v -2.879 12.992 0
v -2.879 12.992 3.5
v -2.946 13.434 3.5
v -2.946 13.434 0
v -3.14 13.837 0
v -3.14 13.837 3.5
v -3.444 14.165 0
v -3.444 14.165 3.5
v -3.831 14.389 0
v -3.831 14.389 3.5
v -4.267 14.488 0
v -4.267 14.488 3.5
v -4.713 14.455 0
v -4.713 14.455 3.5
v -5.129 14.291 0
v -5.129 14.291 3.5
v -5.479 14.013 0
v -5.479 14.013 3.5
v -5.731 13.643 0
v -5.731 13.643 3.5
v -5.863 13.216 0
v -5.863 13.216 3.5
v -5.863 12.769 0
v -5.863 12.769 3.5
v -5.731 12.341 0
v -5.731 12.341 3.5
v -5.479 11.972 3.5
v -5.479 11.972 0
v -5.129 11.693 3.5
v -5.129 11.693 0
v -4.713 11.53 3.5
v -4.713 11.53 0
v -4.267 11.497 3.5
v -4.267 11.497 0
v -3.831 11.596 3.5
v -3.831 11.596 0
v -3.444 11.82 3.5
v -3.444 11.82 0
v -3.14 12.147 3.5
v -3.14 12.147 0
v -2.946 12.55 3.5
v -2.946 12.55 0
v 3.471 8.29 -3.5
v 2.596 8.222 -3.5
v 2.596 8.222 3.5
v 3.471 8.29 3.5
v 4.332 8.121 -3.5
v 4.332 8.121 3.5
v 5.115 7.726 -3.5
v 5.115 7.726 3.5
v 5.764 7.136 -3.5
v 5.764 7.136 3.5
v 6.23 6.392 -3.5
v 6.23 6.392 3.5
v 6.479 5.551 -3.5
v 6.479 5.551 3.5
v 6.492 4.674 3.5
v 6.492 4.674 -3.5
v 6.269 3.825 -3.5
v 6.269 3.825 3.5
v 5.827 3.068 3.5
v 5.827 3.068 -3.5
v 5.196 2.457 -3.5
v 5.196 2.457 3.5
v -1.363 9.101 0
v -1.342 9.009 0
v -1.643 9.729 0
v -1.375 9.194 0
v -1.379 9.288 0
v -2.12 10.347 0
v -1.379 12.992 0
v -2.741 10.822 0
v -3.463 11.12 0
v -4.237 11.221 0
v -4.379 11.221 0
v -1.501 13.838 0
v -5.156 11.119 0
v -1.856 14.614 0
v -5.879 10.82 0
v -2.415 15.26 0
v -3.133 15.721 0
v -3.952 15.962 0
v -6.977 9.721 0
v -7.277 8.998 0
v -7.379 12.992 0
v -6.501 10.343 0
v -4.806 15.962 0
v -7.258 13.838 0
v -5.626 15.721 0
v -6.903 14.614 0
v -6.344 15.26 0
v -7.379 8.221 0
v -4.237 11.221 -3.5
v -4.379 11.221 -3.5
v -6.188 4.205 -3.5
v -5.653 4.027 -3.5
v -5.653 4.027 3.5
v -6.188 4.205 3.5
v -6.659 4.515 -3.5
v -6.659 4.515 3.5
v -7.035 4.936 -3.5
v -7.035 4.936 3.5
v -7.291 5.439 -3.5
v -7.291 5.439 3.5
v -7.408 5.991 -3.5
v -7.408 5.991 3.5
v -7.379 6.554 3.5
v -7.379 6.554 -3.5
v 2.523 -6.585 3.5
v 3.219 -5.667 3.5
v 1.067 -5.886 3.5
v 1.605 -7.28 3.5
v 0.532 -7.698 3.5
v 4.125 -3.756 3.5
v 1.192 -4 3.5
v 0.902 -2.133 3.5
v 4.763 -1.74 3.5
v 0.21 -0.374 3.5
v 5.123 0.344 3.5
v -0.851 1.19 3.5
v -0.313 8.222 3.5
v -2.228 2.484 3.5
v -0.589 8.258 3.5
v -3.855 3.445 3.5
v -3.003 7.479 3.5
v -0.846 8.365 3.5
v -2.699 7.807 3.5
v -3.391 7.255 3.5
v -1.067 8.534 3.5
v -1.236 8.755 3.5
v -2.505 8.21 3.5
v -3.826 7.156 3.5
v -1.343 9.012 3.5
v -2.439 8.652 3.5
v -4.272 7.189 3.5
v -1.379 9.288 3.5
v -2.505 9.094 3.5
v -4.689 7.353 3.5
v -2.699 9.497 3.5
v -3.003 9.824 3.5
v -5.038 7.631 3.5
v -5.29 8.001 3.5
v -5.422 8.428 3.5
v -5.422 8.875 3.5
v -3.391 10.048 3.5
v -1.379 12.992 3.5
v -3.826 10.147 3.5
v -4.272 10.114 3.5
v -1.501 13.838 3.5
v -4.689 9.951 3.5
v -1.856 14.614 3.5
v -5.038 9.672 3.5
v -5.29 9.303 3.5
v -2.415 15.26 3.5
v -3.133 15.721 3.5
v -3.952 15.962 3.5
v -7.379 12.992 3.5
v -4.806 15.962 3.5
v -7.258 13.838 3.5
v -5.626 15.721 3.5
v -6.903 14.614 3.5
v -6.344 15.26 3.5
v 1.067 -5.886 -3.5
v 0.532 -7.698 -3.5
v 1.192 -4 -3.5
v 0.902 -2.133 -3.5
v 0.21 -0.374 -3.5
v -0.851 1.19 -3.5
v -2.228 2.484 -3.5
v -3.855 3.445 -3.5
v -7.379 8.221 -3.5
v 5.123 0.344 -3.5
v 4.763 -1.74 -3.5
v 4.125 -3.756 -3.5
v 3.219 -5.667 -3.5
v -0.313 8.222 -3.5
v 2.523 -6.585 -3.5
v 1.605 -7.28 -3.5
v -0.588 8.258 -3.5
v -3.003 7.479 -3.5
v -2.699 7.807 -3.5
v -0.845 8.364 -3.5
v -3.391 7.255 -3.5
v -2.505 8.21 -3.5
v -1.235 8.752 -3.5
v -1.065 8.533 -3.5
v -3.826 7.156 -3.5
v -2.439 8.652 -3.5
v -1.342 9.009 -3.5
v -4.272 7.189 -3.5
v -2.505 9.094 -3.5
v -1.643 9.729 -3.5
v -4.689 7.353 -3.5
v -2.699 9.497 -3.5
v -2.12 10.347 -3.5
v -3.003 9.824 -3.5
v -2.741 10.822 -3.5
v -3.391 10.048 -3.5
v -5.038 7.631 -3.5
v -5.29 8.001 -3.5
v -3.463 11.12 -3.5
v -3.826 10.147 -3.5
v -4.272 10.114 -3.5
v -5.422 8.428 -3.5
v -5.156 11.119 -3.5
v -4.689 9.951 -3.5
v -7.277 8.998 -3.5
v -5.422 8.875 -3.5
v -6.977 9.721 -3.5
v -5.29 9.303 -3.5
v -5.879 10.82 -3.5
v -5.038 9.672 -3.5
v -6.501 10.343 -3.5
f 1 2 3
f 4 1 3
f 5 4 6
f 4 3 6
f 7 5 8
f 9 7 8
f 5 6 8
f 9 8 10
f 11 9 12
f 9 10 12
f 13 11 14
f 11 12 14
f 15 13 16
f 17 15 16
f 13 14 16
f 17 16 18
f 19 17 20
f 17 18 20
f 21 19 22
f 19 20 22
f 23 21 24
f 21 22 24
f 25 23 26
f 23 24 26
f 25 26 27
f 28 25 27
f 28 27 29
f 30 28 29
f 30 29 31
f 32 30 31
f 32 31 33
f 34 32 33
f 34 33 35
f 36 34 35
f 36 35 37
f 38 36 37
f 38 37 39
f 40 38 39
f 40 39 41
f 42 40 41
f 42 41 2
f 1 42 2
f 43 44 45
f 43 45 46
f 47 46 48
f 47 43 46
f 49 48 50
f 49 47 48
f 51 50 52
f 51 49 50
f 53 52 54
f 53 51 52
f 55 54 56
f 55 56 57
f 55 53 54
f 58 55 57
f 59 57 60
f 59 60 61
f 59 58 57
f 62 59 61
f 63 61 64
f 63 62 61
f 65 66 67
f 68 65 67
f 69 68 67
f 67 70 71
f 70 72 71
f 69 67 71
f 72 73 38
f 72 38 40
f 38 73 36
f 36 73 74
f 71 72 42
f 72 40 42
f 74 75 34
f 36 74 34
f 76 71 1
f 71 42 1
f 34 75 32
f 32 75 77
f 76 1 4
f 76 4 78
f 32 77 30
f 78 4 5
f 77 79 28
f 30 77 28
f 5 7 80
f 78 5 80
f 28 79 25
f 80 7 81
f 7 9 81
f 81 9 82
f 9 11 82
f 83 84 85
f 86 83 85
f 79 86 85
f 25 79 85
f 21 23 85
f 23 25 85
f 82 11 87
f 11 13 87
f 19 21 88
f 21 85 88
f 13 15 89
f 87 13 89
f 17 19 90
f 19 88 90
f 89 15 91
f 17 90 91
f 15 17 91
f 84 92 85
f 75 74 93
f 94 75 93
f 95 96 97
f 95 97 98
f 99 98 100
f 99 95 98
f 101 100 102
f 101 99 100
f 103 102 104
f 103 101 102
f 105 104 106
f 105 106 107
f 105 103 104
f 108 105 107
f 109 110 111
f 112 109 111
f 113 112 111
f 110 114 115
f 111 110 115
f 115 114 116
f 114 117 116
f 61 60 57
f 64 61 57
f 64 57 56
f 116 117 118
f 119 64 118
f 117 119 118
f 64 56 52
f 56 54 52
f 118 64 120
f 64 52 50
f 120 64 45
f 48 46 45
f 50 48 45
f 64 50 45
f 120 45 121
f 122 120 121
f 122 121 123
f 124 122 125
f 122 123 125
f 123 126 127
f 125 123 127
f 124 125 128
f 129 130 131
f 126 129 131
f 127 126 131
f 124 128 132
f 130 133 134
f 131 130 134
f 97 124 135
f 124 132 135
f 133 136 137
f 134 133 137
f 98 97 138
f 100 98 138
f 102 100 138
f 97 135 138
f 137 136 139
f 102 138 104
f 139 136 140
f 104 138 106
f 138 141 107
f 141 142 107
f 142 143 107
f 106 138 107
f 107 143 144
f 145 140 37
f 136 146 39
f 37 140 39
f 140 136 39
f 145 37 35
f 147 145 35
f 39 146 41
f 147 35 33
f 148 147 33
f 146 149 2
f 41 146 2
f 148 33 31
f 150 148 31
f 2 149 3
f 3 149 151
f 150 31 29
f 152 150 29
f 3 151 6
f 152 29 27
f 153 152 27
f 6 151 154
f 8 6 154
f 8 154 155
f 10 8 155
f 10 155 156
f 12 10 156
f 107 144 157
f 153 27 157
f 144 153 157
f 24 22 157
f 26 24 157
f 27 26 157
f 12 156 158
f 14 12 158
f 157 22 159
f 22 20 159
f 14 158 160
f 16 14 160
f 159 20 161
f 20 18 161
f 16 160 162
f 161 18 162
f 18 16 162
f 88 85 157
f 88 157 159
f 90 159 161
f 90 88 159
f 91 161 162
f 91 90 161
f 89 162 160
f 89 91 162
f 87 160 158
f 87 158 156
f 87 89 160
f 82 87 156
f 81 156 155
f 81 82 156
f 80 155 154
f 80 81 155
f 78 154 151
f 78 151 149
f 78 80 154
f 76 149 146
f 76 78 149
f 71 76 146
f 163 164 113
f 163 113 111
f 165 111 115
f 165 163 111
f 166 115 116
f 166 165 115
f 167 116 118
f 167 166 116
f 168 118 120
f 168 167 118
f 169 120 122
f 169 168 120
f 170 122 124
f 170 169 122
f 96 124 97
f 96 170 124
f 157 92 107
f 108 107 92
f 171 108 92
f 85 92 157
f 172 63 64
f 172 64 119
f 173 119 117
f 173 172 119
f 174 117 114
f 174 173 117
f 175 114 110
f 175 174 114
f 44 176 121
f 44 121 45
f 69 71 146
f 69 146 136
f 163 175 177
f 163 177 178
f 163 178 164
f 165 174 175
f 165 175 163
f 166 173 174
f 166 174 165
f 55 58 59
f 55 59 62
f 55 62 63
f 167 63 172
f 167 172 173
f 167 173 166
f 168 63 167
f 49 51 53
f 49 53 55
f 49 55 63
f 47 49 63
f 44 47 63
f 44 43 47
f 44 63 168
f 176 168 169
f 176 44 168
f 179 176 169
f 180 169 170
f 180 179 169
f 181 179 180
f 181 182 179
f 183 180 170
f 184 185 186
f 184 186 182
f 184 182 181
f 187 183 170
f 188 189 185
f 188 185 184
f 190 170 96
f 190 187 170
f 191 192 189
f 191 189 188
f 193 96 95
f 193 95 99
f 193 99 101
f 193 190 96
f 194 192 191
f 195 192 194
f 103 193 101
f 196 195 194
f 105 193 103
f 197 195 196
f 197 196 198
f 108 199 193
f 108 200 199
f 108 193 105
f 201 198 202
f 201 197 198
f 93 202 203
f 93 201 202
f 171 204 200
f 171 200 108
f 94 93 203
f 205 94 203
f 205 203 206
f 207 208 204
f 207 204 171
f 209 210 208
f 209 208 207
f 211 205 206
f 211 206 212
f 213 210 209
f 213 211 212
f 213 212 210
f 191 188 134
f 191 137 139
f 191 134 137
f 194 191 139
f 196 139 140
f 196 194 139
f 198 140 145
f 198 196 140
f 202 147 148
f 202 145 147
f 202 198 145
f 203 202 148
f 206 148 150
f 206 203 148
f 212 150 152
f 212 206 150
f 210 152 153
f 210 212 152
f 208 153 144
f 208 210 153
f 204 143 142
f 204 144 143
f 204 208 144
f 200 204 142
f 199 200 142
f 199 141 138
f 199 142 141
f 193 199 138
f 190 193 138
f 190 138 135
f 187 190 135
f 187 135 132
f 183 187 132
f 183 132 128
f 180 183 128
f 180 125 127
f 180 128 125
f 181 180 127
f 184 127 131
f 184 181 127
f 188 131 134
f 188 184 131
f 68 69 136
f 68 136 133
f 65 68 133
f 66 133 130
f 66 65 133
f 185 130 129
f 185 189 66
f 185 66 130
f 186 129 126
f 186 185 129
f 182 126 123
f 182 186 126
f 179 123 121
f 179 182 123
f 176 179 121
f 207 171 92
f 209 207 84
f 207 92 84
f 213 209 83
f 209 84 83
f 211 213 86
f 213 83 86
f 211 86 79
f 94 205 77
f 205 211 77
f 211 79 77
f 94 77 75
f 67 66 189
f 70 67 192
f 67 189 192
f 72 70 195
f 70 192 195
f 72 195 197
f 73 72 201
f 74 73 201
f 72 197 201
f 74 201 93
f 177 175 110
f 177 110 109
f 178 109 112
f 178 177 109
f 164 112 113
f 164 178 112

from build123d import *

# Parameters (mm, degrees)
BOSS_EXTRUDE1_DEPTH      = 3.5
BOSS_EXTRUDE1_DEPTH_BACK = 3.5
SKETCH6_R                = 1.5
CUT_EXTRUDE1_DEPTH       = 19.96660999
SKETCH7_W                = 4.034122634
SKETCH7_H                = 6.882168449
CUT_EXTRUDE2_DEPTH       = 18.97170817
FILLET1_R                = 3
CUT_EXTRUDE3_DEPTH       = 18.97170817
CUT_EXTRUDE3_DEPTH_BACK  = 18.97170817
SKETCH5_R                = 1.5


with BuildPart() as part:
    # Sketch1 → Boss-Extrude1 (new, two sides: drawn at the far end of the back side and taken through both)
    with BuildSketch(Plane.XY.offset(-BOSS_EXTRUDE1_DEPTH_BACK)):
        with BuildLine():
            Line((-7.379331989, 6.554089817), (-7.379331989, 12.992324067))
            ThreePointArc((-7.379331989, 12.992324067), (-4.379331989, 15.992324067), (-1.379331989, 12.992324067))
            Line((-1.379331989, 12.992324067), (-1.379331989, 9.288226288))
            ThreePointArc((-1.379331989, 9.288226288), (-1.067058002, 8.534330194), (-0.313161909, 8.222056208))
            Line((-0.313161909, 8.222056208), (2.596292865, 8.222056208))
            ThreePointArc((2.596292865, 8.222056208), (6.230009224, 6.392230094), (5.19642183, 2.457277072))
            ThreePointArc((5.19642183, 2.457277072), (4.763363262, -1.740328915), (3.218784408, -5.667377669))
            ThreePointArc((3.218784408, -5.667377669), (2.087900651, -6.964096239), (0.531658525, -7.697913361))
            ThreePointArc((0.531658525, -7.697913361), (0.209560398, -0.37433078), (-5.652587934, 4.027240071))
            ThreePointArc((-5.652587934, 4.027240071), (-7.035324124, 4.93575307), (-7.379331989, 6.554089817))
        make_face()
    extrude(amount=BOSS_EXTRUDE1_DEPTH + BOSS_EXTRUDE1_DEPTH_BACK)

    # Sketch6 → Cut-Extrude1 (cut, through all)
    with BuildSketch(Plane.XY.offset(3.5)):
        with Locations((-4.379331989, 12.992324067)):
            Circle(SKETCH6_R)
    extrude(amount=-CUT_EXTRUDE1_DEPTH, mode=Mode.SUBTRACT)

    # Sketch7 → Cut-Extrude2 (cut, through all)
    with BuildSketch(Plane(origin=(0, 0, 0), x_dir=(0, 0, -1), z_dir=(1, 0, 0))):
        with Locations((2.017061317, 14.662562736)):
            Rectangle(SKETCH7_W, SKETCH7_H)
    extrude(amount=-CUT_EXTRUDE2_DEPTH, mode=Mode.SUBTRACT)

    # Fillet1
    # the kernel refuses this fillet: 3 mm, written as the material it takes off along each edge
    with BuildSketch(Plane(origin=(-7.379331989, 11.221478511, 0), x_dir=(0, -1, 0), z_dir=(0, 0, -1))) as fillet1_piece_1:
        with BuildLine():
            CenterArc((FILLET1_R, -FILLET1_R), FILLET1_R, 90, 90)
            Line((0, -FILLET1_R), (0, 0))
            Line((0, 0), (FILLET1_R, 0))
        make_face()
    extrude(amount=11, mode=Mode.SUBTRACT)
    with BuildSketch(Plane(origin=(-1.379331989, 11.221478511, -10.643941593), x_dir=(0.016872794888794368, -0.9998576442637425, 0), z_dir=(0, 0, 1))) as fillet1_piece_2:
        with BuildLine():
            CenterArc((2.951357628, -2.907788229), FILLET1_R, 104.242588424, 74.790625764)
            Line((-0.048215304, -2.857169845), (-0.348172598, -2.852108006))
            Line((-0.348172598, -2.852108006), (-0.299957293, 0.005061838))
            Line((-0.299957293, 0.005061838), (0.005061838, 0.299957293))
            ThreePointArc((0.005061838, 0.299957293), (1.938038852, 0.267337925), (2.13946551, 0.290778823))
            Line((2.13946551, 0.290778823), (2.213273884, 0))
        make_face()
    extrude(amount=10.643941593, mode=Mode.SUBTRACT)

    # Sketch5 → Cut-Extrude3 (cut, two sides: drawn at the far end of the back side and taken through both)
    with BuildSketch(Plane.XY.offset(-CUT_EXTRUDE3_DEPTH_BACK)):
        with Locations((-3.938565523, 8.651692055)):
            Circle(SKETCH5_R)
    extrude(amount=CUT_EXTRUDE3_DEPTH + CUT_EXTRUDE3_DEPTH_BACK, mode=Mode.SUBTRACT)


solid = part.part
